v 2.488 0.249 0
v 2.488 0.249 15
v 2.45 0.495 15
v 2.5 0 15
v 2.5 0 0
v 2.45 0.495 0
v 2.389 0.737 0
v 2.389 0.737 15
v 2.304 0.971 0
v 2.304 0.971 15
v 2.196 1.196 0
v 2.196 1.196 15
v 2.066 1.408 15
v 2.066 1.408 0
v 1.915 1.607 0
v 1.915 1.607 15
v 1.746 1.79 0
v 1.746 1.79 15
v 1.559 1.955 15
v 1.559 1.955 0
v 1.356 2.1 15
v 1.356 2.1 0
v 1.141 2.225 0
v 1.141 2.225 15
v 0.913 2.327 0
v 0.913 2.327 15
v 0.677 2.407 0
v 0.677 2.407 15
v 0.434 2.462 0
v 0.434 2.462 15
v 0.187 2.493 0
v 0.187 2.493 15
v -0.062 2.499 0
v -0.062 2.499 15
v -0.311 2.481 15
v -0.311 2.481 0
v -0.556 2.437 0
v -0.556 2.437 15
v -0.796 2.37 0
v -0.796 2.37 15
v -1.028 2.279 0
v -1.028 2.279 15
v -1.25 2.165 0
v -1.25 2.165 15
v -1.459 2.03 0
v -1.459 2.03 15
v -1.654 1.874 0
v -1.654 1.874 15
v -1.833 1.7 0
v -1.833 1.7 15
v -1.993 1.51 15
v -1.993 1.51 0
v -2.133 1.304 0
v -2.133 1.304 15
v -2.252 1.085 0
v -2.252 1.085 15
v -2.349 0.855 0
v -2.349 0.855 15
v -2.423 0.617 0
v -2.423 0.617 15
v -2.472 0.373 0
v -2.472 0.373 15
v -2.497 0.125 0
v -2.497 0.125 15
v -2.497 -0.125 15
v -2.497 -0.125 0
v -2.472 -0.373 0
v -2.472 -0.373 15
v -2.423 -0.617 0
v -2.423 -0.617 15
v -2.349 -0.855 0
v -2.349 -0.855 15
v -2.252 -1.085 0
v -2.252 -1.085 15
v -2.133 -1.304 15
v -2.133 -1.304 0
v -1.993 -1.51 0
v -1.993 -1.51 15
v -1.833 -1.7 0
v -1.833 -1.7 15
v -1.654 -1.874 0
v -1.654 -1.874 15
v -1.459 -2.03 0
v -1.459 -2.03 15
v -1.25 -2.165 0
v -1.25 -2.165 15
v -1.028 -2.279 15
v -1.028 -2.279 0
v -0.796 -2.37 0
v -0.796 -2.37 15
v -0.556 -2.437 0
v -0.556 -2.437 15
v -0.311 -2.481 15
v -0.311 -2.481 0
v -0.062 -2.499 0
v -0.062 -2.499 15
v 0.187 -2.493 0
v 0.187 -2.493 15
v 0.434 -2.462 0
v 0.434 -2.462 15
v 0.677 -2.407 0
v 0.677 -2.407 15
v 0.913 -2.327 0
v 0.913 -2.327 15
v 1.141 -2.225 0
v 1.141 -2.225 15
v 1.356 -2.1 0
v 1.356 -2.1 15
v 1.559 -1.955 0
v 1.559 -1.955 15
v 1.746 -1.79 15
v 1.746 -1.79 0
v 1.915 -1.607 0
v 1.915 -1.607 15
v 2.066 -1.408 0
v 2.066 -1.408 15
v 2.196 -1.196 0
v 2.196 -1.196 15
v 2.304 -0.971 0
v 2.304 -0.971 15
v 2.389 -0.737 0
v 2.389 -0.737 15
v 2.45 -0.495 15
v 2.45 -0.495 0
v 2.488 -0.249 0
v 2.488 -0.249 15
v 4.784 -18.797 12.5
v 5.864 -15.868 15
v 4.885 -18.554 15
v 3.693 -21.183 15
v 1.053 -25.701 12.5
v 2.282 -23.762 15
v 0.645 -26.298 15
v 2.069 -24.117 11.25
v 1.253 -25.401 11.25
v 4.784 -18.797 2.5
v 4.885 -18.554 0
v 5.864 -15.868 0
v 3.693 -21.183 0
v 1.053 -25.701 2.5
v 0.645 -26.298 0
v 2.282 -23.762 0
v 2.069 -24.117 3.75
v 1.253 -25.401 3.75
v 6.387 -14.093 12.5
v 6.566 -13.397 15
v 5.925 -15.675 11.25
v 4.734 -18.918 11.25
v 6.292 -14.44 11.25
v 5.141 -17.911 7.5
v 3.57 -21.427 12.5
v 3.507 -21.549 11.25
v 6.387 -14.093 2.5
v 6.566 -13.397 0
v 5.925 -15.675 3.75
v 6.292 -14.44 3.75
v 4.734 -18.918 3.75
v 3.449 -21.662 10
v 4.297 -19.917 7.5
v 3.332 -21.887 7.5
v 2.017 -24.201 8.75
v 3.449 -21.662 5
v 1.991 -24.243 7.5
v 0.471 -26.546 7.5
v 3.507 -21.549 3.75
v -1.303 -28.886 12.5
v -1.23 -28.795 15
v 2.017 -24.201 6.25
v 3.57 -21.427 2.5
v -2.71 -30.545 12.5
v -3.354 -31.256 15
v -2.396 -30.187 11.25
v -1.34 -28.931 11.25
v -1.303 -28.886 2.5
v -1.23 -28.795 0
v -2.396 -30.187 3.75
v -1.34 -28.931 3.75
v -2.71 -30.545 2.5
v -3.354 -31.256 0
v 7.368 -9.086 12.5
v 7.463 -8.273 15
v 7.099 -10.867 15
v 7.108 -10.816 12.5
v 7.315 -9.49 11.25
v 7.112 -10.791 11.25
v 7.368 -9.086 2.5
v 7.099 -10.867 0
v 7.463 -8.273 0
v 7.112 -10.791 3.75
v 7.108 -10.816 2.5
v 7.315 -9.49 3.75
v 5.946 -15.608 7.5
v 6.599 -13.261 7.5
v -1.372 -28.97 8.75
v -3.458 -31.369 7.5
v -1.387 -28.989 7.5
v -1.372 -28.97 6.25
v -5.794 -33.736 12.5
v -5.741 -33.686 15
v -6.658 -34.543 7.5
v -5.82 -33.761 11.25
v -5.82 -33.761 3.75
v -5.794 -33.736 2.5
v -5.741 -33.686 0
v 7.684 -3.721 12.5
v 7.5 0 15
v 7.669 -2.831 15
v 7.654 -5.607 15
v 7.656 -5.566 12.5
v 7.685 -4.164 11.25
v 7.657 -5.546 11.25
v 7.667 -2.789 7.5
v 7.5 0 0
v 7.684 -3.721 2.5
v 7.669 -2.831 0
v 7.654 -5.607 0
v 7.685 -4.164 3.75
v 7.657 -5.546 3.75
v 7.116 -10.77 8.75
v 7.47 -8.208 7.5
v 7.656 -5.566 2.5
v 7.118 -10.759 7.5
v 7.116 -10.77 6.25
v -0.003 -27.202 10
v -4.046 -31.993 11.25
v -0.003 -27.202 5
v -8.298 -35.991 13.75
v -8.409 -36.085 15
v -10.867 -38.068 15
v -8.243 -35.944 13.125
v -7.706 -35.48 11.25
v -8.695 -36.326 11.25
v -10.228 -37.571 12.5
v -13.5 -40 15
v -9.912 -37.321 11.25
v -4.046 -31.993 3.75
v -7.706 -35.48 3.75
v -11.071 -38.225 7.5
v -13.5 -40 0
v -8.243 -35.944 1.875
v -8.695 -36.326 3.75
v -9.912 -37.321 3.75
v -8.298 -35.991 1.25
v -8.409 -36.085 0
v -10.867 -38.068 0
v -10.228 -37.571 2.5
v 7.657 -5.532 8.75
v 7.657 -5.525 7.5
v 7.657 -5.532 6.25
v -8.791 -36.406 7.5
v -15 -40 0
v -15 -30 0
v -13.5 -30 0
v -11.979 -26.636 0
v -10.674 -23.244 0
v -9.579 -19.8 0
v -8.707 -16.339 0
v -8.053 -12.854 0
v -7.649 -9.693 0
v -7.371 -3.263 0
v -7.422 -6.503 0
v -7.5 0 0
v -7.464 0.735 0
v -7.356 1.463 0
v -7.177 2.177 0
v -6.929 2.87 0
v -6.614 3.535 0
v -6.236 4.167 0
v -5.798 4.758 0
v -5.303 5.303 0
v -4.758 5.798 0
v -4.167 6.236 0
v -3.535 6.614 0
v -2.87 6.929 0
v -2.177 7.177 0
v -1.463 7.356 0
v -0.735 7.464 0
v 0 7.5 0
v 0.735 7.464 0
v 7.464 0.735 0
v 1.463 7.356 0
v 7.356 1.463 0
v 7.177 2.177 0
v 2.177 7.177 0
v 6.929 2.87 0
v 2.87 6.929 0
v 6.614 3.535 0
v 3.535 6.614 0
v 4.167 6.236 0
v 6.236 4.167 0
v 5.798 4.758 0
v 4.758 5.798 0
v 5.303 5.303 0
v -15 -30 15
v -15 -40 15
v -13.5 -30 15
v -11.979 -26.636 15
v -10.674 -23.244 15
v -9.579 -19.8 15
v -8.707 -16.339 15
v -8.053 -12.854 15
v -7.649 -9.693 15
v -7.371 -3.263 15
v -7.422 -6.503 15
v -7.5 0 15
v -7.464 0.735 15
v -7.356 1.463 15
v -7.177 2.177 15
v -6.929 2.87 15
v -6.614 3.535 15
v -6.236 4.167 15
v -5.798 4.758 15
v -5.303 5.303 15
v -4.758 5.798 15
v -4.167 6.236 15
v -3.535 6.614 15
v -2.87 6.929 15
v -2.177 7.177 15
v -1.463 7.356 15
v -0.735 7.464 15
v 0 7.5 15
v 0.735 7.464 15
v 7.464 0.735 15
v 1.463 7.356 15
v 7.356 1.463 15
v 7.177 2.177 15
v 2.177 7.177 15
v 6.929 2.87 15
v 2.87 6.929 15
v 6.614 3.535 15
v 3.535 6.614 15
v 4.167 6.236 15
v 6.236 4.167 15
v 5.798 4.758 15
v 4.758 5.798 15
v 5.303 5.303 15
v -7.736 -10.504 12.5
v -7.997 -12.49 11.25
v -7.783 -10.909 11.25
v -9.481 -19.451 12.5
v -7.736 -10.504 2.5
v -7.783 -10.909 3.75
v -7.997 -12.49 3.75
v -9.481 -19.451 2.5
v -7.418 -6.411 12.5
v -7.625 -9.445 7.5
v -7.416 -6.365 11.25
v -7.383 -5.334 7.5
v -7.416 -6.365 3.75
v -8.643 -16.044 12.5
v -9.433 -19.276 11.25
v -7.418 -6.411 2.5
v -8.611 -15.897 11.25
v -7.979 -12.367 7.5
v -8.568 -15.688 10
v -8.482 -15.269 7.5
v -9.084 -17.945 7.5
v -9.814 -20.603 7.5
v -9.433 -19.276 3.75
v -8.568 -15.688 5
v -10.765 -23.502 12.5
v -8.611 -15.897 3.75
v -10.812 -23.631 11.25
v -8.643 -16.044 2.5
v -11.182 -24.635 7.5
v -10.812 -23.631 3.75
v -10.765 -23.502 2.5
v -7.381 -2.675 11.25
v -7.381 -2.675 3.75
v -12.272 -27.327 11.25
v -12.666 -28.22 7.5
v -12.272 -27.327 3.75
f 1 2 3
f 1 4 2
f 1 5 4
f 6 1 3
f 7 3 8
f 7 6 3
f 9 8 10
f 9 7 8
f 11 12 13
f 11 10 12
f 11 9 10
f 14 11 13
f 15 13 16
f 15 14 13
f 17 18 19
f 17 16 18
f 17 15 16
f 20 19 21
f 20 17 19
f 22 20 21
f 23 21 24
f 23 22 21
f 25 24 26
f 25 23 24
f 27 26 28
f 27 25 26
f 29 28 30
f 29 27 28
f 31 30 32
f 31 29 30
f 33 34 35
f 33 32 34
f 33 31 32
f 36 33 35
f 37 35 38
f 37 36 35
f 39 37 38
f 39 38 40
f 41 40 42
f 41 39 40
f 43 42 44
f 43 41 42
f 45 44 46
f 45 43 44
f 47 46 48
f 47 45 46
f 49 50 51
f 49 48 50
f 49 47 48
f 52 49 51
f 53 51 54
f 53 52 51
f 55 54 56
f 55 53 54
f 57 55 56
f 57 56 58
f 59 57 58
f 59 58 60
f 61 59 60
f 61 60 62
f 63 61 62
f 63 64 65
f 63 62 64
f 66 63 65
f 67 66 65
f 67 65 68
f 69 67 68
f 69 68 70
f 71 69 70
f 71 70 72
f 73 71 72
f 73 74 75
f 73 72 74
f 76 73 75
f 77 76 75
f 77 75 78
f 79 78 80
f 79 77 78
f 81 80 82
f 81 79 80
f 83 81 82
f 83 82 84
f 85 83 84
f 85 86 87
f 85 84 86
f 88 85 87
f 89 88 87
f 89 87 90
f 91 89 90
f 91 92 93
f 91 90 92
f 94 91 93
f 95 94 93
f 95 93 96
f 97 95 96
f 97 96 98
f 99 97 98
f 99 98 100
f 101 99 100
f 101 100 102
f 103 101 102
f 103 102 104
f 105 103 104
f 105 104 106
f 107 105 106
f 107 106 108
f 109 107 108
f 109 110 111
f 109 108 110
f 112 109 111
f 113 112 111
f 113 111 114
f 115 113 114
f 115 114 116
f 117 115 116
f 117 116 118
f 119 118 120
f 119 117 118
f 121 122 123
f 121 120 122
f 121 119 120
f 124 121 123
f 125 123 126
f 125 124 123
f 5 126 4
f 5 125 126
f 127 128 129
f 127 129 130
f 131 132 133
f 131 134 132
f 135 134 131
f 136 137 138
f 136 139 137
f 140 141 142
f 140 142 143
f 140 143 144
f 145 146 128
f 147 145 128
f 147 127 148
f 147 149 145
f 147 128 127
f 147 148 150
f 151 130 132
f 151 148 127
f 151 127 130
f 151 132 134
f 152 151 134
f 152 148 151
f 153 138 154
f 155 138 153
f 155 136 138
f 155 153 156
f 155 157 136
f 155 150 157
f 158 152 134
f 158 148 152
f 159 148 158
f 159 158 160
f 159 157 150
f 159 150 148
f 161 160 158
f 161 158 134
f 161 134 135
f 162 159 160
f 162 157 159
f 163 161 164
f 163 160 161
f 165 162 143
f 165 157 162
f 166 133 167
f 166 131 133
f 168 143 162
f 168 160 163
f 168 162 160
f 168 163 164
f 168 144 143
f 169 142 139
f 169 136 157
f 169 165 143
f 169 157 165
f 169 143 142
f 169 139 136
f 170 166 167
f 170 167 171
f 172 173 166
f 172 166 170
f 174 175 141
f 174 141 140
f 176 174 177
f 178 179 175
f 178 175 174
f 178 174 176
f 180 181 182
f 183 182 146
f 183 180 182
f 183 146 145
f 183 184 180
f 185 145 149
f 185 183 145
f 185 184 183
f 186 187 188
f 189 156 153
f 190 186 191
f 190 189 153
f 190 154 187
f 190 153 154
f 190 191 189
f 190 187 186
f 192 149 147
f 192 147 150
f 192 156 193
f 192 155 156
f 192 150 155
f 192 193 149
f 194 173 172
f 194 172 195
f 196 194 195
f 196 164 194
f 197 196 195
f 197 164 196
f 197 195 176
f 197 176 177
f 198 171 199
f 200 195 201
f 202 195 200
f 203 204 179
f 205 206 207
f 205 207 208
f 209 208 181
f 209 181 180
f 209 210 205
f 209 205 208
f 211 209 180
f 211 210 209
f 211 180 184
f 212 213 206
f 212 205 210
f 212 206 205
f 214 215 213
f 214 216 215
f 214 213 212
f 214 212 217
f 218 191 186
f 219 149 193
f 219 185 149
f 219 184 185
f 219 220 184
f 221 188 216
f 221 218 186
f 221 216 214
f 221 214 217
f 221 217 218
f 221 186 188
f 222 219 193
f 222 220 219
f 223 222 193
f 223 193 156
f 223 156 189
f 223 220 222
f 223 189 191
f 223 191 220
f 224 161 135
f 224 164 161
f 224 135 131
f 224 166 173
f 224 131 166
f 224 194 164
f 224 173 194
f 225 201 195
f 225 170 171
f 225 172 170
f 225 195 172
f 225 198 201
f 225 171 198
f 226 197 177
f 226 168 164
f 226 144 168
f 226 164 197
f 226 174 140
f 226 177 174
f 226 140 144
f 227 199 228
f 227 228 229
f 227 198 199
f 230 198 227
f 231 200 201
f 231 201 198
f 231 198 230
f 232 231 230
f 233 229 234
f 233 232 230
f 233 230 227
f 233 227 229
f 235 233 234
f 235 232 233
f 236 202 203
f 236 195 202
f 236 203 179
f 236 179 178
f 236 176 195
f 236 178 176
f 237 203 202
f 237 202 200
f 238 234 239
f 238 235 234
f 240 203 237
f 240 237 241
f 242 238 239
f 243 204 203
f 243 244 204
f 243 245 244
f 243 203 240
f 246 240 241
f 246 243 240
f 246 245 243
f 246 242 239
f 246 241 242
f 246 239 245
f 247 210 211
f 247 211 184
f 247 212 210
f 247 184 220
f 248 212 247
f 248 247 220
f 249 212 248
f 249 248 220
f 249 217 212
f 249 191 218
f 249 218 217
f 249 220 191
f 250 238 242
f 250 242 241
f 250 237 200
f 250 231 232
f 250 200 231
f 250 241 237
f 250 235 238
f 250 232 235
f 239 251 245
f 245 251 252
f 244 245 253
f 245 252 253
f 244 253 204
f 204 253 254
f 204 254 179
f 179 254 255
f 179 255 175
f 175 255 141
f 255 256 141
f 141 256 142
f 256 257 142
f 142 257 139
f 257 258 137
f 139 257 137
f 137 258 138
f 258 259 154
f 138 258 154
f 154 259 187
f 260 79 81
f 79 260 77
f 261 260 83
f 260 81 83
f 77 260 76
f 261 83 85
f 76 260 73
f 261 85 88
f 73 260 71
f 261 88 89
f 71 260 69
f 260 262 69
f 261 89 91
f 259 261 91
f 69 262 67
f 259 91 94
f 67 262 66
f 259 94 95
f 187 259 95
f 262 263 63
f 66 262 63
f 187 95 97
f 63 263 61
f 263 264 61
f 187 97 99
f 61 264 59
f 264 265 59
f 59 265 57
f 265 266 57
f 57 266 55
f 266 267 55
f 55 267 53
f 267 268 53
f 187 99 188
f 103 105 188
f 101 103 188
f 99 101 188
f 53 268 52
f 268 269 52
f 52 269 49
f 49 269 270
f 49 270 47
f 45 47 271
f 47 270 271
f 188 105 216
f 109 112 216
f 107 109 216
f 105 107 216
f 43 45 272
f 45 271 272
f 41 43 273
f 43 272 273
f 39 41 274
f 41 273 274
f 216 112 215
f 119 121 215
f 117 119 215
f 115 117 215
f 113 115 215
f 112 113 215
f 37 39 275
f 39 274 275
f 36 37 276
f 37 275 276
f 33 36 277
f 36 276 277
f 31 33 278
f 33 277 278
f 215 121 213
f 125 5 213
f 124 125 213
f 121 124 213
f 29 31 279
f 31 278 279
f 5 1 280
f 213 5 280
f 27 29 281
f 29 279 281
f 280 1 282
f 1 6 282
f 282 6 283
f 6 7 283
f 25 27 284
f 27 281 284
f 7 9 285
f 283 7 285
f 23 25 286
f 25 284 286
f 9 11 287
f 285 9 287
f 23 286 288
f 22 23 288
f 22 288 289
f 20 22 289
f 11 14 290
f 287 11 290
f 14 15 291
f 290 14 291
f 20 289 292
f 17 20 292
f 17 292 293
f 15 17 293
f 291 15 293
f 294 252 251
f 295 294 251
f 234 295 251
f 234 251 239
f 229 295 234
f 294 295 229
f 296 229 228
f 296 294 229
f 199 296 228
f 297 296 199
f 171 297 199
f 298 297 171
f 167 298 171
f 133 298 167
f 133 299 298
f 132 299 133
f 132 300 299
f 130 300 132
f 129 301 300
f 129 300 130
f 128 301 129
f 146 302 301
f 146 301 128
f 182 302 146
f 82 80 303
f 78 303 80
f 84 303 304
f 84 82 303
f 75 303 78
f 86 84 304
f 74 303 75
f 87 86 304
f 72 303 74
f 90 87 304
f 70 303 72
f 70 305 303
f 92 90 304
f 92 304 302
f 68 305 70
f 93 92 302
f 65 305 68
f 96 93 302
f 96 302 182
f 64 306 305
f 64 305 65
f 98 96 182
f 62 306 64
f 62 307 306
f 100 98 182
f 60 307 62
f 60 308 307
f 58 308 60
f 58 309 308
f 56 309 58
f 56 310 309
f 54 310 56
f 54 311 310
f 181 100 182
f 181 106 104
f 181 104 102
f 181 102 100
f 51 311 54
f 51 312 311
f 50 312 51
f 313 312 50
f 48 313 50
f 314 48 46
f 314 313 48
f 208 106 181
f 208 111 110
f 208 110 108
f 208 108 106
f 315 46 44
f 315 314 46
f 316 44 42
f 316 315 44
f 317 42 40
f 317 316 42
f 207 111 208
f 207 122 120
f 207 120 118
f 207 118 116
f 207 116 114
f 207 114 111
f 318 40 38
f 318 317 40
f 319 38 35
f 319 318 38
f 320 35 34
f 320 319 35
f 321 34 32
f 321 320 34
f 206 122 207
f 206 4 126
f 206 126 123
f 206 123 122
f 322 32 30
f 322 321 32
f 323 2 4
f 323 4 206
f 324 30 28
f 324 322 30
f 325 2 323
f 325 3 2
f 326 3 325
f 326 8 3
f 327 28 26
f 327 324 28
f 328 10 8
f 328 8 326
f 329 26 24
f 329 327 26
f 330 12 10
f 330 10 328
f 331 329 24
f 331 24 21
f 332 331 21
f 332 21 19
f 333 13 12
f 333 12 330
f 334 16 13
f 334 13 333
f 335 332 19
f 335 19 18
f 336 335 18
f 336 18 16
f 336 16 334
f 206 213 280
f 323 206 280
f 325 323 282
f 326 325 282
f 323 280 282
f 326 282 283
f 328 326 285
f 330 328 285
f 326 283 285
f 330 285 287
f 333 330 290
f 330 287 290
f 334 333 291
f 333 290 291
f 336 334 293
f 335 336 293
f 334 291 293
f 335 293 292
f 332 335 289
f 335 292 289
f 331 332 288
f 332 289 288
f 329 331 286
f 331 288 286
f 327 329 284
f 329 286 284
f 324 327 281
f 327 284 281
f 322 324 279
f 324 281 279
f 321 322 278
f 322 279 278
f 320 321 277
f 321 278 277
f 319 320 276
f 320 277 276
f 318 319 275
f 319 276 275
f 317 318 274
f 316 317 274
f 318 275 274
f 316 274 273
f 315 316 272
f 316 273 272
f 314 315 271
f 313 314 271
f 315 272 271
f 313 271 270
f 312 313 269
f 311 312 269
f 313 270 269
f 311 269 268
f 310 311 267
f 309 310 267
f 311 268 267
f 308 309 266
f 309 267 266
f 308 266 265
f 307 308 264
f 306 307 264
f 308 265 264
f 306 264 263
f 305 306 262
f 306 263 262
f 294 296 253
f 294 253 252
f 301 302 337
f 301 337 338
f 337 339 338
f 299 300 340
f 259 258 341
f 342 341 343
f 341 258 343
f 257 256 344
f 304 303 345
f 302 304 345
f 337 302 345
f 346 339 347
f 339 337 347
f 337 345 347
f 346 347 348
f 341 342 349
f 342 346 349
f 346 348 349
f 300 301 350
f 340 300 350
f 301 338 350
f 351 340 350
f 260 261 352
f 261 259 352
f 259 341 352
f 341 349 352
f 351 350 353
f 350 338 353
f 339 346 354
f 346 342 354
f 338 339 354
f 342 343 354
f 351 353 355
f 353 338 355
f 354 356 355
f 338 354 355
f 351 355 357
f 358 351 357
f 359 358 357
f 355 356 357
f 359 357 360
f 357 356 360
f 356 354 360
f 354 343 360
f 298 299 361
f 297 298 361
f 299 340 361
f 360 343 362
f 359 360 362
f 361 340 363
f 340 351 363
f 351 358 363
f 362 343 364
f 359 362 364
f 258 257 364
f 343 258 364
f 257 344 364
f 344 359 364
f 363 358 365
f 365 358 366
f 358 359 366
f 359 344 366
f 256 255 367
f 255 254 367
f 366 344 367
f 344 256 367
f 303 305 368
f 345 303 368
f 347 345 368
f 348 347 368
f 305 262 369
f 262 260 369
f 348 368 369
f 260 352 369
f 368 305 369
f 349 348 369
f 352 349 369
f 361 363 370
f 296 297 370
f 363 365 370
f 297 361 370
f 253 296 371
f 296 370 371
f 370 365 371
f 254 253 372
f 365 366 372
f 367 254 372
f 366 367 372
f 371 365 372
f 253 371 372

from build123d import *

# Parameters (mm, degrees)
BOSS_EXTRUDE1_DEPTH     = 15
CUT_EXTRUDE1_DEPTH      = 46.276925845
CUT_EXTRUDE1_DEPTH_BACK = 46.276925845
SKETCH2_R               = 2.5


with BuildPart() as part:
    # Sketch1 → Boss-Extrude1 (new body)
    with BuildSketch(Plane.XY):
        with BuildLine():
            Line((-15, -40), (-13.5, -40))
            add(Edge.make_bspline(
                [(7.5, 0), (9.663811458, -23.774808376), (-13.5, -40)],
                knots=[0, 0, 0, 1, 1, 1], degree=2))
            ThreePointArc((7.5, 0), (0, 7.5), (-7.5, 0))
            add(Edge.make_bspline(
                [(-7.5, 0), (-6.464333995, -15.538187235), (-13.5, -30)],
                knots=[0, 0, 0, 1, 1, 1], degree=2))
            Line((-13.5, -30), (-15, -30))
            Line((-15, -30), (-15, -40))
        make_face()
    extrude(amount=BOSS_EXTRUDE1_DEPTH)

    # Sketch2 → Cut-Extrude1 (cut, two sides: drawn at the far end of the back side and taken through both)
    with BuildSketch(Plane.XY.offset(15).offset(-CUT_EXTRUDE1_DEPTH_BACK)):
        Circle(SKETCH2_R)
    extrude(amount=CUT_EXTRUDE1_DEPTH + CUT_EXTRUDE1_DEPTH_BACK, mode=Mode.SUBTRACT)


solid = part.part
